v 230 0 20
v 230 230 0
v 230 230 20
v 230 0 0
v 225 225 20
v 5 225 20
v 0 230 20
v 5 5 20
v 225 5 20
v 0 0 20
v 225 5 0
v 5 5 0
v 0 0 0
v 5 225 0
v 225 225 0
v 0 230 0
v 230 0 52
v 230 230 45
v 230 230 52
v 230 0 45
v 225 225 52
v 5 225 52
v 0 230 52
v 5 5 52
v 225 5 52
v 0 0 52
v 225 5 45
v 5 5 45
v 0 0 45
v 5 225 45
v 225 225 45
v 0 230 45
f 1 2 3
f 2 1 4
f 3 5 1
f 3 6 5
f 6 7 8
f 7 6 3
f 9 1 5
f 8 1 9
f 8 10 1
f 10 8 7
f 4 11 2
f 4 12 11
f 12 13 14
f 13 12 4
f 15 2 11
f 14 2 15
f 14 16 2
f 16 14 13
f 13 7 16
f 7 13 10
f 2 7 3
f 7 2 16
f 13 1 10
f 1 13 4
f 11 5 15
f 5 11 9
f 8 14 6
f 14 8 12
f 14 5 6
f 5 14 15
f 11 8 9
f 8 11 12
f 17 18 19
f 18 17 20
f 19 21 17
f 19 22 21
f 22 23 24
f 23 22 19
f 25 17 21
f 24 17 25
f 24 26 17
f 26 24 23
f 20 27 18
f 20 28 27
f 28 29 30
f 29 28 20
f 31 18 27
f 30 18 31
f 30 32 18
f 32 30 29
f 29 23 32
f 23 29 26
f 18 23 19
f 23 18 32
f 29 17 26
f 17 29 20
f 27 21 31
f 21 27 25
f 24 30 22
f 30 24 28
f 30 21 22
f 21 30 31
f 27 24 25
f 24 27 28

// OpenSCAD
difference()
{
cube([230,230,20]);
translate([5,5,0])cube([(230-10), (230 - 10), 20]);
}

translate([0,0,(25+20)])difference()
{
cube([230,230,7]);
translate([5,5,0])cube([(230-10), (230 - 10),7]);
}
